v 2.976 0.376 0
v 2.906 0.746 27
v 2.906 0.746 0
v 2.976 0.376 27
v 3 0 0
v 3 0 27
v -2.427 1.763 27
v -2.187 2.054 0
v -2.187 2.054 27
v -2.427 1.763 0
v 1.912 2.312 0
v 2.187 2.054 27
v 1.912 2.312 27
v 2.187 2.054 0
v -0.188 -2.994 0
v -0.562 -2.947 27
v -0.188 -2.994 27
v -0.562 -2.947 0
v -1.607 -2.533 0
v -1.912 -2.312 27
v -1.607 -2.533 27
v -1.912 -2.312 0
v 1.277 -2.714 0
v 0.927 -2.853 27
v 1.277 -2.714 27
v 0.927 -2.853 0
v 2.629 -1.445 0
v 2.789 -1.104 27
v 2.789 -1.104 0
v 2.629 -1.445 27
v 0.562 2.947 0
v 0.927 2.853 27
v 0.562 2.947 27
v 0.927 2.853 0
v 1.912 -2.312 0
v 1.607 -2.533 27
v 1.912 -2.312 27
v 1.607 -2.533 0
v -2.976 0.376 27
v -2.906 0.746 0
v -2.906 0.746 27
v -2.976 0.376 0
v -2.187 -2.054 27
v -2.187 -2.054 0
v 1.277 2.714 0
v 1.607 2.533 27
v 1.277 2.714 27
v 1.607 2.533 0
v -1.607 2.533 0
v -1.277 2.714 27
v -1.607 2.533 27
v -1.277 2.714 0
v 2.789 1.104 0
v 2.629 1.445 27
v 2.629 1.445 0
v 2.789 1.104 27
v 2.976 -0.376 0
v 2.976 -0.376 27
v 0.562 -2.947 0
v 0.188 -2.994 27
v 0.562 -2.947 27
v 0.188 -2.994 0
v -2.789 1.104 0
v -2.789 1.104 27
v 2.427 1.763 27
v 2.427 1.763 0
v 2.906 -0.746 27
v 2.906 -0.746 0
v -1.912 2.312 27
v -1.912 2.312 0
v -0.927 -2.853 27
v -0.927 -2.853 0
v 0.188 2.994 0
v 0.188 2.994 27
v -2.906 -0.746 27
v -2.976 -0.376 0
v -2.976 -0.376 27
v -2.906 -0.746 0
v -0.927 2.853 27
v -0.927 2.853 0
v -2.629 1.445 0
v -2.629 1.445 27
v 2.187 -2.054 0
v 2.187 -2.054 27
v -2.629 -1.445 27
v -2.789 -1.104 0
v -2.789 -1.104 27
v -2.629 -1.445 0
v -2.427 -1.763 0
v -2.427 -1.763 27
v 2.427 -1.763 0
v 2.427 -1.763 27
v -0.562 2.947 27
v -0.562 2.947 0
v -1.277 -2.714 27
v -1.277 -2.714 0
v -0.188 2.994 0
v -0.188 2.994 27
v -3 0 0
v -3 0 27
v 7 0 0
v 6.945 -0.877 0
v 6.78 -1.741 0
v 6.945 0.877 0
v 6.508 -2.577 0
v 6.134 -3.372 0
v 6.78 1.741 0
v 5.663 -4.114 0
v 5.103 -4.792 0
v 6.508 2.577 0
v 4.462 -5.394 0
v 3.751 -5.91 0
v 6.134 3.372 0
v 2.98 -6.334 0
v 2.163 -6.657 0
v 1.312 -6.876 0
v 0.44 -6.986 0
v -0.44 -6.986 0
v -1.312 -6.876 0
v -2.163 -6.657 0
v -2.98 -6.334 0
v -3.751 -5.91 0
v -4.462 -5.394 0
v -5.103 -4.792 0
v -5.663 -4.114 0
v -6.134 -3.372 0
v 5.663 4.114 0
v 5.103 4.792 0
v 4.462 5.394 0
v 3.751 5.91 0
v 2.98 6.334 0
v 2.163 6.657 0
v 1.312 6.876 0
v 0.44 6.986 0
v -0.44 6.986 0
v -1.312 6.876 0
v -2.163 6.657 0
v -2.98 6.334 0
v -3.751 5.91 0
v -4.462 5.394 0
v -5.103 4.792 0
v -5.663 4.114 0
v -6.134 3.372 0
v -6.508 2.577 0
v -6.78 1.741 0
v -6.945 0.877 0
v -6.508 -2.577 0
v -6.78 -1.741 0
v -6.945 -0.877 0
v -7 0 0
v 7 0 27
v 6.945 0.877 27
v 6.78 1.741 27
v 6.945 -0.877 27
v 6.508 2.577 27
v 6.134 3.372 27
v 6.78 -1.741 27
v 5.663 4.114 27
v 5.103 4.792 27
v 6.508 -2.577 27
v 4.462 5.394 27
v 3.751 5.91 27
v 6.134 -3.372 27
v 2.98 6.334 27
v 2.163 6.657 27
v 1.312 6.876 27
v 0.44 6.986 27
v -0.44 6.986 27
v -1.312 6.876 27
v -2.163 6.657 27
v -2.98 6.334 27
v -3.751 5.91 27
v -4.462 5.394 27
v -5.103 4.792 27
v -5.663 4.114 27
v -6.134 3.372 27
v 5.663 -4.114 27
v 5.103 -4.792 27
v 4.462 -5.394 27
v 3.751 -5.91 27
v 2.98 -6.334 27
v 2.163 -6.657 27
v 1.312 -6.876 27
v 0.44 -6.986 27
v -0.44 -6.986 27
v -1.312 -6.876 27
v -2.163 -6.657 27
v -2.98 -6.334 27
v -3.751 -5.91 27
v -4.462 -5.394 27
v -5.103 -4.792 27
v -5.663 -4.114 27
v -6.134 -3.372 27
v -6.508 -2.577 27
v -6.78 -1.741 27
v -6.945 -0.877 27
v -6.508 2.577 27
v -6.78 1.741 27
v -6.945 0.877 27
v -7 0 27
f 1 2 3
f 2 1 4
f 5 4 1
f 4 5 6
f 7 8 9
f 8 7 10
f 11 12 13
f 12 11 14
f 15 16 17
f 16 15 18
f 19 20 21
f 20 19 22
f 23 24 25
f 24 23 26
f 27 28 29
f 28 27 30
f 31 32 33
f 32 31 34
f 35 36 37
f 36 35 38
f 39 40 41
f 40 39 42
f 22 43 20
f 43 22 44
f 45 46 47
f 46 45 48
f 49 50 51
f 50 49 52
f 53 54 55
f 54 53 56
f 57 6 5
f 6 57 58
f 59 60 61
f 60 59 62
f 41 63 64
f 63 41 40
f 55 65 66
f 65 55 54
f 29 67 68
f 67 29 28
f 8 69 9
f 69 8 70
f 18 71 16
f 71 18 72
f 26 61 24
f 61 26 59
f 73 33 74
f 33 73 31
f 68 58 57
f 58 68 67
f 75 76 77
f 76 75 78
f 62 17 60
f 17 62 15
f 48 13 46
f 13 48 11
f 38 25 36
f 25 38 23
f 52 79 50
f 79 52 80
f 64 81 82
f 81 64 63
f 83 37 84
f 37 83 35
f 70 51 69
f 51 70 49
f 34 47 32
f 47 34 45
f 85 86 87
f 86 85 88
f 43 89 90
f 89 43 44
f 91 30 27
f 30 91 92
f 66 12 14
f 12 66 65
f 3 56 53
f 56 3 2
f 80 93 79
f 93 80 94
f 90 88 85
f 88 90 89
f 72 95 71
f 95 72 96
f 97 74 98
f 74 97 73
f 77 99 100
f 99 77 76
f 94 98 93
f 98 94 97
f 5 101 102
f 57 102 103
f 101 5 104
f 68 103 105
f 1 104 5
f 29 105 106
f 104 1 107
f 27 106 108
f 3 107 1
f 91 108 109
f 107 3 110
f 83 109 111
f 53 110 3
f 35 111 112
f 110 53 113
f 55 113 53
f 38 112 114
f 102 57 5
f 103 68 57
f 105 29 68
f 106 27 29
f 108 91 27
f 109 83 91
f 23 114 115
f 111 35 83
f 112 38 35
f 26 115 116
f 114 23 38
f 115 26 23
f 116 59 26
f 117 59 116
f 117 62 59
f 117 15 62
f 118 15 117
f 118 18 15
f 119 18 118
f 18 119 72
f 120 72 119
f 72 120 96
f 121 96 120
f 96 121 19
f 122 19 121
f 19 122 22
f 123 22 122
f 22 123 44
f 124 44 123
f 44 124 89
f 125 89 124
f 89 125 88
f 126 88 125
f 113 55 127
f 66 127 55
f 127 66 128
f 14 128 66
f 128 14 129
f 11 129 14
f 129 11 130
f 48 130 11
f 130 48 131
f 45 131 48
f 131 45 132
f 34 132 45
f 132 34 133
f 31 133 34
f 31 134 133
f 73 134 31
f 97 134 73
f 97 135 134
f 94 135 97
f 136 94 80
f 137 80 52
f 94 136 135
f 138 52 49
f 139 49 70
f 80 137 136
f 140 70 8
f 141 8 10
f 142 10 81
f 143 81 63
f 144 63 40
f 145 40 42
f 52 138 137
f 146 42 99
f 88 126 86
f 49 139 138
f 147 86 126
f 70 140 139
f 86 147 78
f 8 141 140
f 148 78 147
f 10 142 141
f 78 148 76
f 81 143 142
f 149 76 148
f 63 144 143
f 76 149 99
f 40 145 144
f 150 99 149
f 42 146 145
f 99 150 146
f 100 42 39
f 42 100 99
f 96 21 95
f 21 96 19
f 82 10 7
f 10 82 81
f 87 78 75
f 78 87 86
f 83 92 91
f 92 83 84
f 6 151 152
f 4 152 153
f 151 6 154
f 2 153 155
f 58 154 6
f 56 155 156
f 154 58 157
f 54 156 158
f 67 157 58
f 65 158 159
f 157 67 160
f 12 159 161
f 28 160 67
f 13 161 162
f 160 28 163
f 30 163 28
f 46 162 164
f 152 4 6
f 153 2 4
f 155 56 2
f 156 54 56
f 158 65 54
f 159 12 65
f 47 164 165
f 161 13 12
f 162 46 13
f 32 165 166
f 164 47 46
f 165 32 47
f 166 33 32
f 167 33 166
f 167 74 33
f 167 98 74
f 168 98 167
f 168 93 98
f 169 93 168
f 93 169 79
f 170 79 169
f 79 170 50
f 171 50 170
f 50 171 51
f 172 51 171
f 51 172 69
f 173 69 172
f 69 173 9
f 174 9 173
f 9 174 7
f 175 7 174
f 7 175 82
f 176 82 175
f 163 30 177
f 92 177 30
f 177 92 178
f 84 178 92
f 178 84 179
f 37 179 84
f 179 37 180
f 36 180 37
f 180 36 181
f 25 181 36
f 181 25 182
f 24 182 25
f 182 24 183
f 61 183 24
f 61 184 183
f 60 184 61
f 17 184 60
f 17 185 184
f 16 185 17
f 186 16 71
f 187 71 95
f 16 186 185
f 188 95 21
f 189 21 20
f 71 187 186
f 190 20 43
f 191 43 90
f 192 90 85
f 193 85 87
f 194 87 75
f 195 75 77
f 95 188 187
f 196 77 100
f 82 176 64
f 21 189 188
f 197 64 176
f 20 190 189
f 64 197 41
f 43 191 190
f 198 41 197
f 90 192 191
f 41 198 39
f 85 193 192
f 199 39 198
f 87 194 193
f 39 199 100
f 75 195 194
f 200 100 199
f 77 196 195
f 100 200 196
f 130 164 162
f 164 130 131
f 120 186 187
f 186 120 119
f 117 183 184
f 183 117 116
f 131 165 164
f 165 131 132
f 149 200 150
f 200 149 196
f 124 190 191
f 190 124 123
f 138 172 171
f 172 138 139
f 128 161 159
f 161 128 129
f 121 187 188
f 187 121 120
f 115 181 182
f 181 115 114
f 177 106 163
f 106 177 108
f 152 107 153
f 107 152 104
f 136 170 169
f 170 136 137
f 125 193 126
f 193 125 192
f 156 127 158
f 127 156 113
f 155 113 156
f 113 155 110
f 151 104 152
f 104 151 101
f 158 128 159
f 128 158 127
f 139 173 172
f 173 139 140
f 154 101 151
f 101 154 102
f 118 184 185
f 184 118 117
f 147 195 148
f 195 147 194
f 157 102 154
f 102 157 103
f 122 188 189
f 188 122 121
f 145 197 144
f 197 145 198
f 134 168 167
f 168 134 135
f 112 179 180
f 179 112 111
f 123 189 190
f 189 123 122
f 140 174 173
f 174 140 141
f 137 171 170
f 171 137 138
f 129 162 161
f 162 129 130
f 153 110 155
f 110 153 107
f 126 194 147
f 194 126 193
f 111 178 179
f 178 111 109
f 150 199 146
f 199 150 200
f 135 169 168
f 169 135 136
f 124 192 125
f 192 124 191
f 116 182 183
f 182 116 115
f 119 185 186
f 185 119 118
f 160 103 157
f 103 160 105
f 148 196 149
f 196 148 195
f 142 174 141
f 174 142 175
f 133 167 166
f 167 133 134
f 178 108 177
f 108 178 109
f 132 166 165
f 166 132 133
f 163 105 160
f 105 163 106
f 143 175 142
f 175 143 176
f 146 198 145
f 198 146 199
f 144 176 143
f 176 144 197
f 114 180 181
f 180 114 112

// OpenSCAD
$fn = 50;

difference() {
	union() {
		cylinder(h = 27, r = 7.0);
	}
	union() {
		cylinder(h = 27, r = 3.0);
		cylinder(h = 27, r = 1.5);
	}
}
